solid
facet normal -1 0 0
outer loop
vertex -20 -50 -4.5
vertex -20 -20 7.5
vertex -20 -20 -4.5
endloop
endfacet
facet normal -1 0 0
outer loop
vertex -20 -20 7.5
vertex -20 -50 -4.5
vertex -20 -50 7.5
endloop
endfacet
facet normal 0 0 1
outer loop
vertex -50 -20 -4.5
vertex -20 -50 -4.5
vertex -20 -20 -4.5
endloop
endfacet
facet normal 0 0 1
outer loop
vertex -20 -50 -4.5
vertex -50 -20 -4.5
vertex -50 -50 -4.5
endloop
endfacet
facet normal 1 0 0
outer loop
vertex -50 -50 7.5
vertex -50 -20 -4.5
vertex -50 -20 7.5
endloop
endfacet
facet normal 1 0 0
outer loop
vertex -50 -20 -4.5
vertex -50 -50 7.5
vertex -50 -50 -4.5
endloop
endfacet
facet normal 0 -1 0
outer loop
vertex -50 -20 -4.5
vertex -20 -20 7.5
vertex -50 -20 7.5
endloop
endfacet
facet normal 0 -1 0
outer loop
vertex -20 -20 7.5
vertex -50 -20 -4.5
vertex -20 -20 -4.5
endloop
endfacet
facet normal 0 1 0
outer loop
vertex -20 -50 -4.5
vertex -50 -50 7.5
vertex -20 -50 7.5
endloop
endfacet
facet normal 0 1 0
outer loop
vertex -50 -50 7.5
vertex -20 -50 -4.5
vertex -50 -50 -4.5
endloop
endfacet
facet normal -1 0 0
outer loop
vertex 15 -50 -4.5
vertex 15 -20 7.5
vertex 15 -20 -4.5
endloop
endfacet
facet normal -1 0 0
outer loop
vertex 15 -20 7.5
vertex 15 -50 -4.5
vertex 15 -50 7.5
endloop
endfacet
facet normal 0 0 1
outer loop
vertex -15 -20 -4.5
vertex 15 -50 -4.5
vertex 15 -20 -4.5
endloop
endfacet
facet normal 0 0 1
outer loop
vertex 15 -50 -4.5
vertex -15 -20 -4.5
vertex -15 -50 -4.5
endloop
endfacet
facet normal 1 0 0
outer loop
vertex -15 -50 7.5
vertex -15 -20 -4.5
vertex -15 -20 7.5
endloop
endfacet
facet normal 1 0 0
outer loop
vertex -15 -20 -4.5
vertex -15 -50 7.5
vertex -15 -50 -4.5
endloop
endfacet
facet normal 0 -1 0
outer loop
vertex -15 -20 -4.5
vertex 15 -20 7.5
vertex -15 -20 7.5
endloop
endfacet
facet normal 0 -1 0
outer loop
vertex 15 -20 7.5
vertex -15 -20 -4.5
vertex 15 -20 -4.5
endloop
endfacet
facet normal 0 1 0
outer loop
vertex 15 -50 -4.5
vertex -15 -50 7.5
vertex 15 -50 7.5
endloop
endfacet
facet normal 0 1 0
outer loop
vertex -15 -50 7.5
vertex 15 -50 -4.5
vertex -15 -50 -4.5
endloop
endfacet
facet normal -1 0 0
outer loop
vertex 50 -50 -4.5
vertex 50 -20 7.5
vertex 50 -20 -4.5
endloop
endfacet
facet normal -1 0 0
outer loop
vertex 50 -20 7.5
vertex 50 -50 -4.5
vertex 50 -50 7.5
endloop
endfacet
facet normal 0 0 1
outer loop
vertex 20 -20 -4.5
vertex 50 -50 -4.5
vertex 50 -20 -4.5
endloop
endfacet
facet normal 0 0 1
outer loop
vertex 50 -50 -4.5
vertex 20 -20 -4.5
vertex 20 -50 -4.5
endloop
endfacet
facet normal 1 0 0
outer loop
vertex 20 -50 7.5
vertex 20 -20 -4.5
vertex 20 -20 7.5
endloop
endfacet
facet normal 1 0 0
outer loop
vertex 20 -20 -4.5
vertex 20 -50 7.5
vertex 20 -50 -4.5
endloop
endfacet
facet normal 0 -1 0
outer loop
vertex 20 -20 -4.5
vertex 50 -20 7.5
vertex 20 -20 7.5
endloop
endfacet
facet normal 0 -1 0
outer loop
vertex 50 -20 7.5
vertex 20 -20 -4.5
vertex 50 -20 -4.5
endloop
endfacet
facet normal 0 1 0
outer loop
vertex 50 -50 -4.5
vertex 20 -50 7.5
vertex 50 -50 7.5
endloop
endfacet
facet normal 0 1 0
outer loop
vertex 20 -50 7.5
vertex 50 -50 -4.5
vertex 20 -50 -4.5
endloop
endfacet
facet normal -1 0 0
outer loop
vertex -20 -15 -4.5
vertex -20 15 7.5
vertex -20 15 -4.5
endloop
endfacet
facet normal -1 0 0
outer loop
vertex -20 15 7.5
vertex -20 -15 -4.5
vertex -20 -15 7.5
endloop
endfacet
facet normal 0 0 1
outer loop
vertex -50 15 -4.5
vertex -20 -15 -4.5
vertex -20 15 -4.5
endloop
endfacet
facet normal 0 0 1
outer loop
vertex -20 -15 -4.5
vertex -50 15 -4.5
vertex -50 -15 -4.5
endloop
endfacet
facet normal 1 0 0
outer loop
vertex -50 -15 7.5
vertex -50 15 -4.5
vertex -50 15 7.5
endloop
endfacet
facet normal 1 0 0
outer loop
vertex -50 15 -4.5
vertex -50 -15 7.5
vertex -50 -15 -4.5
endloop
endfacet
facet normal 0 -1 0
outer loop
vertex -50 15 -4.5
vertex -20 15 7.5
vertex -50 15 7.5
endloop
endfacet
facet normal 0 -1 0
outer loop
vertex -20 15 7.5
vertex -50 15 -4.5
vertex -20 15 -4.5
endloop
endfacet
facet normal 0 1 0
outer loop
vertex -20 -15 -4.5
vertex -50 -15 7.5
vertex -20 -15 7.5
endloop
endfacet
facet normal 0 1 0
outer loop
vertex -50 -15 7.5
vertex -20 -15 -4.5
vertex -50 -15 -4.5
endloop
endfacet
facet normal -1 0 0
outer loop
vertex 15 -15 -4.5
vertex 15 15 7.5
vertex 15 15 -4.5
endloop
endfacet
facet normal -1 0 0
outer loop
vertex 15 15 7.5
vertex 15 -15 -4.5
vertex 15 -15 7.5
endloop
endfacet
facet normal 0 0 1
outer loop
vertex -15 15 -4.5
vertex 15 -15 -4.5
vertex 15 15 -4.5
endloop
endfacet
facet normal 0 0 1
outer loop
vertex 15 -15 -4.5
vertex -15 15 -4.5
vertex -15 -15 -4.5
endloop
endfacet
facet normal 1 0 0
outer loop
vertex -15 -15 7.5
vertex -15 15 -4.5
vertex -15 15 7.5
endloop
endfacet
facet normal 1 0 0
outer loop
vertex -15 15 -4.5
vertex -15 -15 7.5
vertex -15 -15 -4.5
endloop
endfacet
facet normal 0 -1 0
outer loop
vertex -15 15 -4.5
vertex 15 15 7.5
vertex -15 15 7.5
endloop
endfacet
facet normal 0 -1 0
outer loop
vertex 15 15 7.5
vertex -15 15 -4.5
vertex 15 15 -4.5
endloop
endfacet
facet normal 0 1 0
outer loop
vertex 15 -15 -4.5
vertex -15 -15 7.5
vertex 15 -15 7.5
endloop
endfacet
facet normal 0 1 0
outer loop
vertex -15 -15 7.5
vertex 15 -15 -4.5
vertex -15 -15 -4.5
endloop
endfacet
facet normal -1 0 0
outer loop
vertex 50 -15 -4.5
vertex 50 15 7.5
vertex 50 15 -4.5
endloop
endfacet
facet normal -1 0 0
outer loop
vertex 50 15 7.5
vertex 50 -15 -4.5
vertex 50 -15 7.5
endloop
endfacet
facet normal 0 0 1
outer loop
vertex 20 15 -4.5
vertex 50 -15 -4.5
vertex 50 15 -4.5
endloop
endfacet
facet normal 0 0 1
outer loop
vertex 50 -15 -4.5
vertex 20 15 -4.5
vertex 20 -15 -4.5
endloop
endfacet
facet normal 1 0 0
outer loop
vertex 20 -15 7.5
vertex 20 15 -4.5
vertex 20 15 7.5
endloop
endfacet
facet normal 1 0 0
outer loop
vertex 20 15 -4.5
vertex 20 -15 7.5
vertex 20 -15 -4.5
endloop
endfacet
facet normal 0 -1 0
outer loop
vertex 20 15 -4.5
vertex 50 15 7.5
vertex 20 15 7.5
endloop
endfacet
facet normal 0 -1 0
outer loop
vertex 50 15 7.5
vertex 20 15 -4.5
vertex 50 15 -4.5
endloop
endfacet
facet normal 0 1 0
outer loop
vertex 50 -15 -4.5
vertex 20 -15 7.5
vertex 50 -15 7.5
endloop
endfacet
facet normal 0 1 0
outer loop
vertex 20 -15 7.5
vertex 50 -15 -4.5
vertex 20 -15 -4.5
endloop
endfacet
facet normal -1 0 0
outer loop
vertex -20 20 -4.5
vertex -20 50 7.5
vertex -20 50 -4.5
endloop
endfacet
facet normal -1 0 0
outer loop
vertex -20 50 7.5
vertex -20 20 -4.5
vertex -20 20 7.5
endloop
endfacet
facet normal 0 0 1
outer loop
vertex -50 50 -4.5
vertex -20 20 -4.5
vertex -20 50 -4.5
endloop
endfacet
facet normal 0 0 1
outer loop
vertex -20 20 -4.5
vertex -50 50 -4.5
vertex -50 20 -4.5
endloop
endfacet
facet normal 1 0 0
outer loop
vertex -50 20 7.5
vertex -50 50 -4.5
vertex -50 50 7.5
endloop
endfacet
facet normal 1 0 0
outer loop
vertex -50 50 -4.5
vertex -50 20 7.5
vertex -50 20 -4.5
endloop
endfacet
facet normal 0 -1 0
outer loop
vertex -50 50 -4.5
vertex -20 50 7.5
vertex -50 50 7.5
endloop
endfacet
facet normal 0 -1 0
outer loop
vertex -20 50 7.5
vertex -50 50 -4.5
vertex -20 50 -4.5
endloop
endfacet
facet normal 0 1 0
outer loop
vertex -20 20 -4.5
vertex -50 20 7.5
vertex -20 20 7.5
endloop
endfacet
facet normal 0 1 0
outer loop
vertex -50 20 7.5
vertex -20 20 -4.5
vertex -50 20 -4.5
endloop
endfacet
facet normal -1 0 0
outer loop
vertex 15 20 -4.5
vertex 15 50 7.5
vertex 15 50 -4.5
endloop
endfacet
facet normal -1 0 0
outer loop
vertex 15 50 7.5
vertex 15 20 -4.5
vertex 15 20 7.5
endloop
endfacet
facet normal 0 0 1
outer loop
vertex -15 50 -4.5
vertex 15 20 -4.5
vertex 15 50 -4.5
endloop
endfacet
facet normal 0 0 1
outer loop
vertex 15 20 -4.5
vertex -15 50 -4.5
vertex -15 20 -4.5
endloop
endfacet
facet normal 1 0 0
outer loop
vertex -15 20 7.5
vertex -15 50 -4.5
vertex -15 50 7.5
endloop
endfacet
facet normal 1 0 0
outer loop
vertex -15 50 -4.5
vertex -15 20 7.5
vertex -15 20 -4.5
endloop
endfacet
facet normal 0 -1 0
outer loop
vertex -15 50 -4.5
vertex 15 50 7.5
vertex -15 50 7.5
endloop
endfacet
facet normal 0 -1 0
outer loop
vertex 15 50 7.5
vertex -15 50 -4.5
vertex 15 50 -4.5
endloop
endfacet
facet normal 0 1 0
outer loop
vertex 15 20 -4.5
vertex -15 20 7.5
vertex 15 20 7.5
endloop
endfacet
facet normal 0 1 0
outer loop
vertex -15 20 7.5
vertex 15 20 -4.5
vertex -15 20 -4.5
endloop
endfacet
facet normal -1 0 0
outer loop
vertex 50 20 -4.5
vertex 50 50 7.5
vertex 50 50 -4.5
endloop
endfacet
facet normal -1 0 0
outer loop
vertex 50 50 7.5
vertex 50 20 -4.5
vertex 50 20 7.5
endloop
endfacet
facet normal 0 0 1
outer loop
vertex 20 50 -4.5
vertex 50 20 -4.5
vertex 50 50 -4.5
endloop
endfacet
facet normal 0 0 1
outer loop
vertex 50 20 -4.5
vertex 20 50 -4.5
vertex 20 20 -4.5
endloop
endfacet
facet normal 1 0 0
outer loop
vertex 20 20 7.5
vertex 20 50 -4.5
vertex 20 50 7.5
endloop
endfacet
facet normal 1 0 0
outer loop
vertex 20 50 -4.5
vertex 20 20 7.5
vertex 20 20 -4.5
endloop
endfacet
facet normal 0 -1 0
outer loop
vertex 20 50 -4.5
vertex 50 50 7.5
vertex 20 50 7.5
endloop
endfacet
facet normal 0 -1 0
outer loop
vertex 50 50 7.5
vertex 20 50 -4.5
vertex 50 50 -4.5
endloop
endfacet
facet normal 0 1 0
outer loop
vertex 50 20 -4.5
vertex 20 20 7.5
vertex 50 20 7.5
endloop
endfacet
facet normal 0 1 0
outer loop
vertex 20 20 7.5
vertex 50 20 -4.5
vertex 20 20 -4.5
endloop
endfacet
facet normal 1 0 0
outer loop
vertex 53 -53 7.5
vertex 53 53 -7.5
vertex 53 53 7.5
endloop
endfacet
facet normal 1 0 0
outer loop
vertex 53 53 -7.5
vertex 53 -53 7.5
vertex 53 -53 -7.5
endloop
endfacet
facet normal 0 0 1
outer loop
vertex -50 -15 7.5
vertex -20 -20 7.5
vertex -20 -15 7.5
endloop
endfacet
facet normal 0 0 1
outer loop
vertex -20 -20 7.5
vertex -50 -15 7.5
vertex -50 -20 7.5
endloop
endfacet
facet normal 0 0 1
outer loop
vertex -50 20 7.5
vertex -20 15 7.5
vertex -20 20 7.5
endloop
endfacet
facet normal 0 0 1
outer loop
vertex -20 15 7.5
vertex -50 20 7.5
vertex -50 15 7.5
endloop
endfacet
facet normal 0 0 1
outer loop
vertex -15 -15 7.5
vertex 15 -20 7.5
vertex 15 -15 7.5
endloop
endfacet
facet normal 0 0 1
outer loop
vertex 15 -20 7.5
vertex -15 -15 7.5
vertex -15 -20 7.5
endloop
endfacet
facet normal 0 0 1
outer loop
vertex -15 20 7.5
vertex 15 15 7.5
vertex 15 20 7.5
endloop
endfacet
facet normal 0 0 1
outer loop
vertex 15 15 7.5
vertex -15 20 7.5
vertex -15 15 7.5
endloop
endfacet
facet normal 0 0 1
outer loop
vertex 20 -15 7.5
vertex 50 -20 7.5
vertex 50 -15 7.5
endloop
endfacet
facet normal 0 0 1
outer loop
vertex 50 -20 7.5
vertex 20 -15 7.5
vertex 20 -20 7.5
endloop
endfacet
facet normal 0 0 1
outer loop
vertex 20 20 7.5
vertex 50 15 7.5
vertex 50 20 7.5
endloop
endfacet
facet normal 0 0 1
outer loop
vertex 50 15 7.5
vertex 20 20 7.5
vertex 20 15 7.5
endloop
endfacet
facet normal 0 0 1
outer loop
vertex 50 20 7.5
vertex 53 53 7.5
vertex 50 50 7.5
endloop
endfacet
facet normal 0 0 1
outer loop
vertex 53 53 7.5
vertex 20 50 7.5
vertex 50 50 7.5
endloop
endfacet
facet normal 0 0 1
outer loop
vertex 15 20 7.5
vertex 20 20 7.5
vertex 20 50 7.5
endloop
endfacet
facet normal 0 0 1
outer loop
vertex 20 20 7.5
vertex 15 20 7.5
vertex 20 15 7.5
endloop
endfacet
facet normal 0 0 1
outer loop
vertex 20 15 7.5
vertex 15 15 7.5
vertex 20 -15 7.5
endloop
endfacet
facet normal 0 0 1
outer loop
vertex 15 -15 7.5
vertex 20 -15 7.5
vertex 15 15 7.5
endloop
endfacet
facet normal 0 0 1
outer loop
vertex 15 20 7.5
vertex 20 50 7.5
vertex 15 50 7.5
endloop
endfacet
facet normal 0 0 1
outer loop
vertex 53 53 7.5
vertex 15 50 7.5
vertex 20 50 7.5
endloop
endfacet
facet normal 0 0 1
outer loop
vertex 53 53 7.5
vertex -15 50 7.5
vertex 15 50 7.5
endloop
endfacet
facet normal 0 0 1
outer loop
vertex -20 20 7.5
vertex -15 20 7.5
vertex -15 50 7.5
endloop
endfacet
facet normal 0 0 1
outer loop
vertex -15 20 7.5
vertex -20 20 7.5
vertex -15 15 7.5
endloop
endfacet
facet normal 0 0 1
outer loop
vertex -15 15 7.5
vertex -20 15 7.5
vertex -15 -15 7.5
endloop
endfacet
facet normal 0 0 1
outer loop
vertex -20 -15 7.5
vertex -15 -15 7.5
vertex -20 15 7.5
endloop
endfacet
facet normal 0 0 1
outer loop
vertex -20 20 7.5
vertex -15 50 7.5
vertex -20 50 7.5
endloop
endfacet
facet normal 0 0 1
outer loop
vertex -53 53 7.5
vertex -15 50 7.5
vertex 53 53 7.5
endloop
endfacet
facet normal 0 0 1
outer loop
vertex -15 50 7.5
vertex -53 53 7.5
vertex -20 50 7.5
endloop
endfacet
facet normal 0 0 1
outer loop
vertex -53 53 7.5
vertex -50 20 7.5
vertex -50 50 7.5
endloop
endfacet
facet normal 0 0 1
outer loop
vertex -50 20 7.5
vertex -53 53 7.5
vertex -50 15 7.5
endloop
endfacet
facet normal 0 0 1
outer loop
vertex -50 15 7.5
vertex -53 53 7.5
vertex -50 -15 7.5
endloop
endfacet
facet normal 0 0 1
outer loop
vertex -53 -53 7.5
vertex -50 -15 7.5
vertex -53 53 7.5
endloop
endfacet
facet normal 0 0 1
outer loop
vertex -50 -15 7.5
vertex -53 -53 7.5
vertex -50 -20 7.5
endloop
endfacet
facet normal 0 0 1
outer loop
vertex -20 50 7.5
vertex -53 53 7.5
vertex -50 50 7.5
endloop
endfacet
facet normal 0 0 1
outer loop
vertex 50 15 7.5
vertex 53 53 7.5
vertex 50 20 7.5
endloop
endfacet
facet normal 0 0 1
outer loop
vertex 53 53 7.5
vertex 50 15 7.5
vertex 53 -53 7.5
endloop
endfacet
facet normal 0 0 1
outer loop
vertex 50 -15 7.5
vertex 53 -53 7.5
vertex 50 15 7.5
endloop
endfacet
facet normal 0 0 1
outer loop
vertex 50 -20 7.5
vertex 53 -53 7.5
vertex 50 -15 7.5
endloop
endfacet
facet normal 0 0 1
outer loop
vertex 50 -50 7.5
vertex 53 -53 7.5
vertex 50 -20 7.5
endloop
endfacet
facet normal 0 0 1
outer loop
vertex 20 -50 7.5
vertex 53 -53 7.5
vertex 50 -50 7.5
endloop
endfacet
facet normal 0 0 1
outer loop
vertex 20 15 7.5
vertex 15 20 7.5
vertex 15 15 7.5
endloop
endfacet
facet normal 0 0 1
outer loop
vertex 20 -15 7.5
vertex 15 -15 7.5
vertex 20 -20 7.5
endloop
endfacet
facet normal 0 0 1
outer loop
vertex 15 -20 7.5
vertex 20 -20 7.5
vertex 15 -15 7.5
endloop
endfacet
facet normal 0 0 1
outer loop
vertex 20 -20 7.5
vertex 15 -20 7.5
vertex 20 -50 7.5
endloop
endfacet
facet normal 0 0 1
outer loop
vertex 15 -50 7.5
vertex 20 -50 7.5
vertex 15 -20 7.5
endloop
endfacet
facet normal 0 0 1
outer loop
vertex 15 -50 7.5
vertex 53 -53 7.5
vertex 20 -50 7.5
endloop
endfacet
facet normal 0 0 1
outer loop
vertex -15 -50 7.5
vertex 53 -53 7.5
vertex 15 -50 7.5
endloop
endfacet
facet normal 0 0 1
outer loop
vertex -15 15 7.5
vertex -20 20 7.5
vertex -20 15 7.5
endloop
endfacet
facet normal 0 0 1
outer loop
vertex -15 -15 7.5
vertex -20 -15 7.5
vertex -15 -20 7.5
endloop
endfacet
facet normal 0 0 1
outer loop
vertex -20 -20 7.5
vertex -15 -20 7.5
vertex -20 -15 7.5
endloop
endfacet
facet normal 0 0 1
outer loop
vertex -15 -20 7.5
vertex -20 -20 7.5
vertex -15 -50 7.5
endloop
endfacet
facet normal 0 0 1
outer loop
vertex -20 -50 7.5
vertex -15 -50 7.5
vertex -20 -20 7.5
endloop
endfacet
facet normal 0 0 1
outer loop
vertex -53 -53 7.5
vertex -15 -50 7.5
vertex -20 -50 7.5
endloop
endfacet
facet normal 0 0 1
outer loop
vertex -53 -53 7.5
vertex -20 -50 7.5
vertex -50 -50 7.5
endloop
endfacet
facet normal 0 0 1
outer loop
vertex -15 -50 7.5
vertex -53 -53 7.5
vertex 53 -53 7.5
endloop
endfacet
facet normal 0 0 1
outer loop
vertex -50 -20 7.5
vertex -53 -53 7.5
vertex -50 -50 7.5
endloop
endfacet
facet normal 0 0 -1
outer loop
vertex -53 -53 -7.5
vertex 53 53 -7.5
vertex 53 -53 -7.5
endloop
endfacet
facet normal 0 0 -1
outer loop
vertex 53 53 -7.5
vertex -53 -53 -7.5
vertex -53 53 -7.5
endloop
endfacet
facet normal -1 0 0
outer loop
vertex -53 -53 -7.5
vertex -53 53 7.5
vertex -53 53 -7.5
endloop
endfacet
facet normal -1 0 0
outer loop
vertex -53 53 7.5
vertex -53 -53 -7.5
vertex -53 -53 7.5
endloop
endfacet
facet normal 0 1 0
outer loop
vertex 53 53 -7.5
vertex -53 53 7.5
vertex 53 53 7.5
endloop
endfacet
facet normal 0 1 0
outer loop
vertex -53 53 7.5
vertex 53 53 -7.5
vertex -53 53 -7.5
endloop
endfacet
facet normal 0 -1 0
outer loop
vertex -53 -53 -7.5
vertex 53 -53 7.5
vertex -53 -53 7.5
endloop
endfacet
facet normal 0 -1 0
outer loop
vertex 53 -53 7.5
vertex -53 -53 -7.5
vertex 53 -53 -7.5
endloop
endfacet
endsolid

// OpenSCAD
$fn = 32;

// ----------------------------------------------------------------------
// Pocket plate 106 x 106 x 15
// 3 x 3 pockets 30 mm square, 12 mm deep
// ----------------------------------------------------------------------

// --- parameters (mm) ---
thickness = 15;  // plate thickness
floor_t = 3;     // material left under each pocket
pocket = 30;     // pocket side length
pitch_x = 35;    // pocket pitch along X
pitch_y = 35;    // pocket pitch along Y
cols = 3;        // pockets per row
rows = 3;        // rows of pockets

// --- derived feature positions (mm) ---
depth = thickness - floor_t;        // = 12   pocket depth, down to the floor
span_x = (cols - 1) * pitch_x;      // = 70   distance between outer pockets
span_y = (rows - 1) * pitch_y;      // = 70   distance between outer pocket rows
origin_x = -span_x / 2;             // = -35   X of the first pocket
origin_y = -span_y / 2;             // = -35   Y of the first pocket
plate = [span_x + pocket + 6, span_y + pocket + 6, thickness];  // = [106, 106, 15]   overall size: pockets plus 3 mm of wall on each side
feature_centers = [
  [origin_x + 0 * pitch_x, origin_y + 0 * pitch_y],
  [origin_x + 1 * pitch_x, origin_y + 0 * pitch_y],
  [origin_x + 2 * pitch_x, origin_y + 0 * pitch_y],
  [origin_x + 0 * pitch_x, origin_y + 1 * pitch_y],
  [origin_x + 1 * pitch_x, origin_y + 1 * pitch_y],
  [origin_x + 2 * pitch_x, origin_y + 1 * pitch_y],
  [origin_x + 0 * pitch_x, origin_y + 2 * pitch_y],
  [origin_x + 1 * pitch_x, origin_y + 2 * pitch_y],
  [origin_x + 2 * pitch_x, origin_y + 2 * pitch_y]
];   // pocket centres, used verbatim by the cutter loop

// plate outline, then one pocket per centre in feature_centers
difference() {
  cube(plate, center = true);
  for (centre = feature_centers)
    translate([centre[0] - pocket / 2, centre[1] - pocket / 2, plate[2] / 2 - depth])
      cube([pocket, pocket, depth + 1]);  // centred on the declared pocket centre
}
